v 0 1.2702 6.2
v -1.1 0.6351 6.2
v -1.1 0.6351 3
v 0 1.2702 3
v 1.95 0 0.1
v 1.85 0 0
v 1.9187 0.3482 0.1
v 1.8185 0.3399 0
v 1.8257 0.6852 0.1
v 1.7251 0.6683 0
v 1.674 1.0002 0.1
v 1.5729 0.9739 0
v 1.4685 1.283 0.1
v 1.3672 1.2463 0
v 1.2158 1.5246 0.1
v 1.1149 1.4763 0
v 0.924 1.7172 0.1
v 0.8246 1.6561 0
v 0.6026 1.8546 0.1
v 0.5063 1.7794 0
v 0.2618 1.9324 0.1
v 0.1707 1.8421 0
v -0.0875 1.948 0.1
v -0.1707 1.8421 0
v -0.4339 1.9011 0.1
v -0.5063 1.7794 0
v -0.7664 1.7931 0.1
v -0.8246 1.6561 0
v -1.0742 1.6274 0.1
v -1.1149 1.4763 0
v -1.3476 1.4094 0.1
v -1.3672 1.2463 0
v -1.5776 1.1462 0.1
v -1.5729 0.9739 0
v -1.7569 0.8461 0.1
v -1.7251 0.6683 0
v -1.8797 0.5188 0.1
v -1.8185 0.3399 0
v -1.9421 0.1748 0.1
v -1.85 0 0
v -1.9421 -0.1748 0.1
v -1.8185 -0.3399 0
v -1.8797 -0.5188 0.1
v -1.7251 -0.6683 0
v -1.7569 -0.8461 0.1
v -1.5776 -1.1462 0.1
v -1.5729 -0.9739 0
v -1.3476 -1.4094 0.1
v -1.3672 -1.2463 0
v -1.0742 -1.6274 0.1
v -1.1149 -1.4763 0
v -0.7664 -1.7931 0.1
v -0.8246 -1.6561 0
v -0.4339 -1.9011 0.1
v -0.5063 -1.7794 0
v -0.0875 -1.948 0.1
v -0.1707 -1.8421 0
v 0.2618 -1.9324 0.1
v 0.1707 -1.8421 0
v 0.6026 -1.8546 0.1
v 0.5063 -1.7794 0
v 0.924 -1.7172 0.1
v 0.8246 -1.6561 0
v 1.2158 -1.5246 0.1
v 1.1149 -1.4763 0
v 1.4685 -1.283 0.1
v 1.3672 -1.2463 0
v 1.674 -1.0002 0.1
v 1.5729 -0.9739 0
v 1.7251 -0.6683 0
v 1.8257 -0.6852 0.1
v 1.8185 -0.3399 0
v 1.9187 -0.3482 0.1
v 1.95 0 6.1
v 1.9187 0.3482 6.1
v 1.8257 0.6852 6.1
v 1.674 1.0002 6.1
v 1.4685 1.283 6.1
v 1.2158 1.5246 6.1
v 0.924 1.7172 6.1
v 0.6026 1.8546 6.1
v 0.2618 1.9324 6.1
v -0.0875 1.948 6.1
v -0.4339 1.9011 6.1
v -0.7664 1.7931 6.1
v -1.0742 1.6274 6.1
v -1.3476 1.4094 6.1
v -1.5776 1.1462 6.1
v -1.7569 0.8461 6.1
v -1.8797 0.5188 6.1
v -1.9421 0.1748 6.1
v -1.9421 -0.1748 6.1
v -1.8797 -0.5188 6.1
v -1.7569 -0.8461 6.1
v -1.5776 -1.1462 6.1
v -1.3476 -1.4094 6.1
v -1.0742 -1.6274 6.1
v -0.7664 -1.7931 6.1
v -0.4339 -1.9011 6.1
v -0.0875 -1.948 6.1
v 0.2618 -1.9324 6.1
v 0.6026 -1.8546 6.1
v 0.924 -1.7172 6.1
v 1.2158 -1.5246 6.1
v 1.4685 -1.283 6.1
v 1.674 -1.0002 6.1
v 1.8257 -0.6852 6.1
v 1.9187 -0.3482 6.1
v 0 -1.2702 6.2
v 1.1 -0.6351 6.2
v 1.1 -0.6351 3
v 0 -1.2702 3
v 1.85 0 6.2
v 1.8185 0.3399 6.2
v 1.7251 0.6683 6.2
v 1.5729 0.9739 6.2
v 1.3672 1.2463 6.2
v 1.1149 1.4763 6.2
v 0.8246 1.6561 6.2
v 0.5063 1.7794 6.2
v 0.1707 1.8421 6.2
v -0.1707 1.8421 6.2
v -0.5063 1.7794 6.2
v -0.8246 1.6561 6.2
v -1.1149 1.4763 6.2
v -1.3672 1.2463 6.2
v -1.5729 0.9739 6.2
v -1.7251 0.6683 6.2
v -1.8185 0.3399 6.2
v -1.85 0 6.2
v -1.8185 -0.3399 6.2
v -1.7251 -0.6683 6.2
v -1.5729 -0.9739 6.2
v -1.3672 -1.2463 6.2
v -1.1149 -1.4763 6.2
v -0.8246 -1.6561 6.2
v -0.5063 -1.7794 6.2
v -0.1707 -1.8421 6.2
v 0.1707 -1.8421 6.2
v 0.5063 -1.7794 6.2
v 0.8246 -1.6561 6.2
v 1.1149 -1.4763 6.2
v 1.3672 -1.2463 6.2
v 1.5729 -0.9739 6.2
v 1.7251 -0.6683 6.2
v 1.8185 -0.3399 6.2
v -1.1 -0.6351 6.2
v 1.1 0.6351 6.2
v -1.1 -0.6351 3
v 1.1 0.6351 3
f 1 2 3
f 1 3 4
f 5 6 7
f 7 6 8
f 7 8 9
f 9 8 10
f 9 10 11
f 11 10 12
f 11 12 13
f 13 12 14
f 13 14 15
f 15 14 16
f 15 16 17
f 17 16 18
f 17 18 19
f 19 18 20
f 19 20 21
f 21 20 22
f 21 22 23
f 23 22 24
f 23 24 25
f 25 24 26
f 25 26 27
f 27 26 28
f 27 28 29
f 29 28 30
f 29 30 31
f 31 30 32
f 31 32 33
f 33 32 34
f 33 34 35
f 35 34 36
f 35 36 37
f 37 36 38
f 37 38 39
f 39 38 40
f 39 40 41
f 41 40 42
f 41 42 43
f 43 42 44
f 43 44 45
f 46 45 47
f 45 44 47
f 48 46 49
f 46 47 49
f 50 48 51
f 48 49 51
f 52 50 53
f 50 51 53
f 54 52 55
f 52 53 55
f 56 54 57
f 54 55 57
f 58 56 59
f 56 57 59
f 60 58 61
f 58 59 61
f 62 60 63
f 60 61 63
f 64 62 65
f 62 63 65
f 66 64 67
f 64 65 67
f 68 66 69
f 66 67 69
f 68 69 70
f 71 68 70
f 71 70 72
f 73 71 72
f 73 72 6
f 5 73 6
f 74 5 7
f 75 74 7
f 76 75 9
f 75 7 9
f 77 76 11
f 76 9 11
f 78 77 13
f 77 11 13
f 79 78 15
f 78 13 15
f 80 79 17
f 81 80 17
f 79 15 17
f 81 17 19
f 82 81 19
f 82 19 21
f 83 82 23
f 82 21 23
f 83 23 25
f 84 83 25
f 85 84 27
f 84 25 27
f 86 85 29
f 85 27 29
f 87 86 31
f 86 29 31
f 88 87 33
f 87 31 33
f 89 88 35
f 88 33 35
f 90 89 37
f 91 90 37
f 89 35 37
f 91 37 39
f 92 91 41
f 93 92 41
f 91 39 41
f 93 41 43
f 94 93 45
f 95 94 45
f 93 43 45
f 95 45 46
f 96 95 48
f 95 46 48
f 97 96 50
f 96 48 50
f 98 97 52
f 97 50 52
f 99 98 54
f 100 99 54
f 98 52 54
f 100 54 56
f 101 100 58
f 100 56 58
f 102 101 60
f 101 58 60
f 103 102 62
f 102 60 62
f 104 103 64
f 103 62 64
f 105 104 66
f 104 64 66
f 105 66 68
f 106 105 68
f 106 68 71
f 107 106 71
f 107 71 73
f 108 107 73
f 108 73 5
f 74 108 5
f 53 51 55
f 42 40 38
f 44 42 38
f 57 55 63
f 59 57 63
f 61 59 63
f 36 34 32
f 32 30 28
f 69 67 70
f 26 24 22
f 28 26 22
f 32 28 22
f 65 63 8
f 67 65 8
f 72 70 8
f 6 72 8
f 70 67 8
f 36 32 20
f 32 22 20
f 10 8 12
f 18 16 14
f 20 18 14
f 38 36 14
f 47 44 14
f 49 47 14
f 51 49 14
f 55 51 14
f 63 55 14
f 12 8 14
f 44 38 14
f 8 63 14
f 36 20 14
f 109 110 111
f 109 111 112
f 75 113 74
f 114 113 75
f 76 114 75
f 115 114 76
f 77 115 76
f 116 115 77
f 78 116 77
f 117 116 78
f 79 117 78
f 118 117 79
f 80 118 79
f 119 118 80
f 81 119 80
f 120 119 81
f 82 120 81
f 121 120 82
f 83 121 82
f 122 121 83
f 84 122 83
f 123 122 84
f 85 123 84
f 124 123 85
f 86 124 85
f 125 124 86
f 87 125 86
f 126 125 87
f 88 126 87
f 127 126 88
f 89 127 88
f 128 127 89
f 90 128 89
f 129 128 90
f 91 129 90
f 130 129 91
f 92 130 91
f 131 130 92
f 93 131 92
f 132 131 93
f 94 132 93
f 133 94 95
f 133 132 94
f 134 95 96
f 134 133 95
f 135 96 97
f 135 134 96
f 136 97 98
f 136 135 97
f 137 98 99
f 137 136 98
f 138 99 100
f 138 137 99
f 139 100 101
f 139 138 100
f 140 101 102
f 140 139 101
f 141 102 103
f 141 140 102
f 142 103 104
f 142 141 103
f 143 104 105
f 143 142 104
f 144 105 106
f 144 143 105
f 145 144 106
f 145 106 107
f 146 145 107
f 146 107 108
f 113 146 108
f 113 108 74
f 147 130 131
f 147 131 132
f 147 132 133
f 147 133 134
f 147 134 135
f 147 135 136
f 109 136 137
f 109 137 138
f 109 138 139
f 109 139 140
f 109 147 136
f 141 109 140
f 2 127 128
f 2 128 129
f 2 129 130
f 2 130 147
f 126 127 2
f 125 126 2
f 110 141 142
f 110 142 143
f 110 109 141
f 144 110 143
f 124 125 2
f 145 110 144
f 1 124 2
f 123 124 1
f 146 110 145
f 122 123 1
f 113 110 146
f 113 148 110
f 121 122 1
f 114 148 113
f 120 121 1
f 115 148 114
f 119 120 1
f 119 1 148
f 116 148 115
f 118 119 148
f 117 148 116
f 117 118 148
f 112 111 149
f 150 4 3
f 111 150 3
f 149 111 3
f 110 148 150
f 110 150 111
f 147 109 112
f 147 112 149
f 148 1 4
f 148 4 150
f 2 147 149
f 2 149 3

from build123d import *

# Parameters (mm, degrees)
CYLINDER006_R     = 1.95
CYLINDER006_DEPTH = 6.2
POCKET_DEPTH      = 3.2
CHAMFER001_SIZE   = 0.1
CHAMFER002_SIZE   = 0.1


with BuildPart() as part:
    # Cylinder006 → Cylinder006 (new body)
    with BuildSketch(Plane.XY):
        Circle(CYLINDER006_R)
    extrude(amount=CYLINDER006_DEPTH)

    # Sketch001 (on Face2 of Cylinder006) → Pocket (cut)
    with BuildSketch(Plane.XY.offset(6.2)):
        Polygon((-1.1, -0.635085), (-1.1, 0.635085), (0, 1.270171), (1.1, 0.635085), (1.1, -0.635085), (0, -1.270171), align=None)
    extrude(amount=-POCKET_DEPTH, mode=Mode.SUBTRACT)

    # Chamfer001
    chamfer001_edges = [part.edges().sort_by_distance(p)[0] for p in [
        (-1.95, 0, 0),
    ]]
    chamfer(chamfer001_edges, length=CHAMFER001_SIZE)

    # Chamfer002
    chamfer002_edges = [part.edges().sort_by_distance(p)[0] for p in [
        (-1.95, 0, 6.2),
    ]]
    chamfer(chamfer002_edges, length=CHAMFER002_SIZE)


solid = part.part
